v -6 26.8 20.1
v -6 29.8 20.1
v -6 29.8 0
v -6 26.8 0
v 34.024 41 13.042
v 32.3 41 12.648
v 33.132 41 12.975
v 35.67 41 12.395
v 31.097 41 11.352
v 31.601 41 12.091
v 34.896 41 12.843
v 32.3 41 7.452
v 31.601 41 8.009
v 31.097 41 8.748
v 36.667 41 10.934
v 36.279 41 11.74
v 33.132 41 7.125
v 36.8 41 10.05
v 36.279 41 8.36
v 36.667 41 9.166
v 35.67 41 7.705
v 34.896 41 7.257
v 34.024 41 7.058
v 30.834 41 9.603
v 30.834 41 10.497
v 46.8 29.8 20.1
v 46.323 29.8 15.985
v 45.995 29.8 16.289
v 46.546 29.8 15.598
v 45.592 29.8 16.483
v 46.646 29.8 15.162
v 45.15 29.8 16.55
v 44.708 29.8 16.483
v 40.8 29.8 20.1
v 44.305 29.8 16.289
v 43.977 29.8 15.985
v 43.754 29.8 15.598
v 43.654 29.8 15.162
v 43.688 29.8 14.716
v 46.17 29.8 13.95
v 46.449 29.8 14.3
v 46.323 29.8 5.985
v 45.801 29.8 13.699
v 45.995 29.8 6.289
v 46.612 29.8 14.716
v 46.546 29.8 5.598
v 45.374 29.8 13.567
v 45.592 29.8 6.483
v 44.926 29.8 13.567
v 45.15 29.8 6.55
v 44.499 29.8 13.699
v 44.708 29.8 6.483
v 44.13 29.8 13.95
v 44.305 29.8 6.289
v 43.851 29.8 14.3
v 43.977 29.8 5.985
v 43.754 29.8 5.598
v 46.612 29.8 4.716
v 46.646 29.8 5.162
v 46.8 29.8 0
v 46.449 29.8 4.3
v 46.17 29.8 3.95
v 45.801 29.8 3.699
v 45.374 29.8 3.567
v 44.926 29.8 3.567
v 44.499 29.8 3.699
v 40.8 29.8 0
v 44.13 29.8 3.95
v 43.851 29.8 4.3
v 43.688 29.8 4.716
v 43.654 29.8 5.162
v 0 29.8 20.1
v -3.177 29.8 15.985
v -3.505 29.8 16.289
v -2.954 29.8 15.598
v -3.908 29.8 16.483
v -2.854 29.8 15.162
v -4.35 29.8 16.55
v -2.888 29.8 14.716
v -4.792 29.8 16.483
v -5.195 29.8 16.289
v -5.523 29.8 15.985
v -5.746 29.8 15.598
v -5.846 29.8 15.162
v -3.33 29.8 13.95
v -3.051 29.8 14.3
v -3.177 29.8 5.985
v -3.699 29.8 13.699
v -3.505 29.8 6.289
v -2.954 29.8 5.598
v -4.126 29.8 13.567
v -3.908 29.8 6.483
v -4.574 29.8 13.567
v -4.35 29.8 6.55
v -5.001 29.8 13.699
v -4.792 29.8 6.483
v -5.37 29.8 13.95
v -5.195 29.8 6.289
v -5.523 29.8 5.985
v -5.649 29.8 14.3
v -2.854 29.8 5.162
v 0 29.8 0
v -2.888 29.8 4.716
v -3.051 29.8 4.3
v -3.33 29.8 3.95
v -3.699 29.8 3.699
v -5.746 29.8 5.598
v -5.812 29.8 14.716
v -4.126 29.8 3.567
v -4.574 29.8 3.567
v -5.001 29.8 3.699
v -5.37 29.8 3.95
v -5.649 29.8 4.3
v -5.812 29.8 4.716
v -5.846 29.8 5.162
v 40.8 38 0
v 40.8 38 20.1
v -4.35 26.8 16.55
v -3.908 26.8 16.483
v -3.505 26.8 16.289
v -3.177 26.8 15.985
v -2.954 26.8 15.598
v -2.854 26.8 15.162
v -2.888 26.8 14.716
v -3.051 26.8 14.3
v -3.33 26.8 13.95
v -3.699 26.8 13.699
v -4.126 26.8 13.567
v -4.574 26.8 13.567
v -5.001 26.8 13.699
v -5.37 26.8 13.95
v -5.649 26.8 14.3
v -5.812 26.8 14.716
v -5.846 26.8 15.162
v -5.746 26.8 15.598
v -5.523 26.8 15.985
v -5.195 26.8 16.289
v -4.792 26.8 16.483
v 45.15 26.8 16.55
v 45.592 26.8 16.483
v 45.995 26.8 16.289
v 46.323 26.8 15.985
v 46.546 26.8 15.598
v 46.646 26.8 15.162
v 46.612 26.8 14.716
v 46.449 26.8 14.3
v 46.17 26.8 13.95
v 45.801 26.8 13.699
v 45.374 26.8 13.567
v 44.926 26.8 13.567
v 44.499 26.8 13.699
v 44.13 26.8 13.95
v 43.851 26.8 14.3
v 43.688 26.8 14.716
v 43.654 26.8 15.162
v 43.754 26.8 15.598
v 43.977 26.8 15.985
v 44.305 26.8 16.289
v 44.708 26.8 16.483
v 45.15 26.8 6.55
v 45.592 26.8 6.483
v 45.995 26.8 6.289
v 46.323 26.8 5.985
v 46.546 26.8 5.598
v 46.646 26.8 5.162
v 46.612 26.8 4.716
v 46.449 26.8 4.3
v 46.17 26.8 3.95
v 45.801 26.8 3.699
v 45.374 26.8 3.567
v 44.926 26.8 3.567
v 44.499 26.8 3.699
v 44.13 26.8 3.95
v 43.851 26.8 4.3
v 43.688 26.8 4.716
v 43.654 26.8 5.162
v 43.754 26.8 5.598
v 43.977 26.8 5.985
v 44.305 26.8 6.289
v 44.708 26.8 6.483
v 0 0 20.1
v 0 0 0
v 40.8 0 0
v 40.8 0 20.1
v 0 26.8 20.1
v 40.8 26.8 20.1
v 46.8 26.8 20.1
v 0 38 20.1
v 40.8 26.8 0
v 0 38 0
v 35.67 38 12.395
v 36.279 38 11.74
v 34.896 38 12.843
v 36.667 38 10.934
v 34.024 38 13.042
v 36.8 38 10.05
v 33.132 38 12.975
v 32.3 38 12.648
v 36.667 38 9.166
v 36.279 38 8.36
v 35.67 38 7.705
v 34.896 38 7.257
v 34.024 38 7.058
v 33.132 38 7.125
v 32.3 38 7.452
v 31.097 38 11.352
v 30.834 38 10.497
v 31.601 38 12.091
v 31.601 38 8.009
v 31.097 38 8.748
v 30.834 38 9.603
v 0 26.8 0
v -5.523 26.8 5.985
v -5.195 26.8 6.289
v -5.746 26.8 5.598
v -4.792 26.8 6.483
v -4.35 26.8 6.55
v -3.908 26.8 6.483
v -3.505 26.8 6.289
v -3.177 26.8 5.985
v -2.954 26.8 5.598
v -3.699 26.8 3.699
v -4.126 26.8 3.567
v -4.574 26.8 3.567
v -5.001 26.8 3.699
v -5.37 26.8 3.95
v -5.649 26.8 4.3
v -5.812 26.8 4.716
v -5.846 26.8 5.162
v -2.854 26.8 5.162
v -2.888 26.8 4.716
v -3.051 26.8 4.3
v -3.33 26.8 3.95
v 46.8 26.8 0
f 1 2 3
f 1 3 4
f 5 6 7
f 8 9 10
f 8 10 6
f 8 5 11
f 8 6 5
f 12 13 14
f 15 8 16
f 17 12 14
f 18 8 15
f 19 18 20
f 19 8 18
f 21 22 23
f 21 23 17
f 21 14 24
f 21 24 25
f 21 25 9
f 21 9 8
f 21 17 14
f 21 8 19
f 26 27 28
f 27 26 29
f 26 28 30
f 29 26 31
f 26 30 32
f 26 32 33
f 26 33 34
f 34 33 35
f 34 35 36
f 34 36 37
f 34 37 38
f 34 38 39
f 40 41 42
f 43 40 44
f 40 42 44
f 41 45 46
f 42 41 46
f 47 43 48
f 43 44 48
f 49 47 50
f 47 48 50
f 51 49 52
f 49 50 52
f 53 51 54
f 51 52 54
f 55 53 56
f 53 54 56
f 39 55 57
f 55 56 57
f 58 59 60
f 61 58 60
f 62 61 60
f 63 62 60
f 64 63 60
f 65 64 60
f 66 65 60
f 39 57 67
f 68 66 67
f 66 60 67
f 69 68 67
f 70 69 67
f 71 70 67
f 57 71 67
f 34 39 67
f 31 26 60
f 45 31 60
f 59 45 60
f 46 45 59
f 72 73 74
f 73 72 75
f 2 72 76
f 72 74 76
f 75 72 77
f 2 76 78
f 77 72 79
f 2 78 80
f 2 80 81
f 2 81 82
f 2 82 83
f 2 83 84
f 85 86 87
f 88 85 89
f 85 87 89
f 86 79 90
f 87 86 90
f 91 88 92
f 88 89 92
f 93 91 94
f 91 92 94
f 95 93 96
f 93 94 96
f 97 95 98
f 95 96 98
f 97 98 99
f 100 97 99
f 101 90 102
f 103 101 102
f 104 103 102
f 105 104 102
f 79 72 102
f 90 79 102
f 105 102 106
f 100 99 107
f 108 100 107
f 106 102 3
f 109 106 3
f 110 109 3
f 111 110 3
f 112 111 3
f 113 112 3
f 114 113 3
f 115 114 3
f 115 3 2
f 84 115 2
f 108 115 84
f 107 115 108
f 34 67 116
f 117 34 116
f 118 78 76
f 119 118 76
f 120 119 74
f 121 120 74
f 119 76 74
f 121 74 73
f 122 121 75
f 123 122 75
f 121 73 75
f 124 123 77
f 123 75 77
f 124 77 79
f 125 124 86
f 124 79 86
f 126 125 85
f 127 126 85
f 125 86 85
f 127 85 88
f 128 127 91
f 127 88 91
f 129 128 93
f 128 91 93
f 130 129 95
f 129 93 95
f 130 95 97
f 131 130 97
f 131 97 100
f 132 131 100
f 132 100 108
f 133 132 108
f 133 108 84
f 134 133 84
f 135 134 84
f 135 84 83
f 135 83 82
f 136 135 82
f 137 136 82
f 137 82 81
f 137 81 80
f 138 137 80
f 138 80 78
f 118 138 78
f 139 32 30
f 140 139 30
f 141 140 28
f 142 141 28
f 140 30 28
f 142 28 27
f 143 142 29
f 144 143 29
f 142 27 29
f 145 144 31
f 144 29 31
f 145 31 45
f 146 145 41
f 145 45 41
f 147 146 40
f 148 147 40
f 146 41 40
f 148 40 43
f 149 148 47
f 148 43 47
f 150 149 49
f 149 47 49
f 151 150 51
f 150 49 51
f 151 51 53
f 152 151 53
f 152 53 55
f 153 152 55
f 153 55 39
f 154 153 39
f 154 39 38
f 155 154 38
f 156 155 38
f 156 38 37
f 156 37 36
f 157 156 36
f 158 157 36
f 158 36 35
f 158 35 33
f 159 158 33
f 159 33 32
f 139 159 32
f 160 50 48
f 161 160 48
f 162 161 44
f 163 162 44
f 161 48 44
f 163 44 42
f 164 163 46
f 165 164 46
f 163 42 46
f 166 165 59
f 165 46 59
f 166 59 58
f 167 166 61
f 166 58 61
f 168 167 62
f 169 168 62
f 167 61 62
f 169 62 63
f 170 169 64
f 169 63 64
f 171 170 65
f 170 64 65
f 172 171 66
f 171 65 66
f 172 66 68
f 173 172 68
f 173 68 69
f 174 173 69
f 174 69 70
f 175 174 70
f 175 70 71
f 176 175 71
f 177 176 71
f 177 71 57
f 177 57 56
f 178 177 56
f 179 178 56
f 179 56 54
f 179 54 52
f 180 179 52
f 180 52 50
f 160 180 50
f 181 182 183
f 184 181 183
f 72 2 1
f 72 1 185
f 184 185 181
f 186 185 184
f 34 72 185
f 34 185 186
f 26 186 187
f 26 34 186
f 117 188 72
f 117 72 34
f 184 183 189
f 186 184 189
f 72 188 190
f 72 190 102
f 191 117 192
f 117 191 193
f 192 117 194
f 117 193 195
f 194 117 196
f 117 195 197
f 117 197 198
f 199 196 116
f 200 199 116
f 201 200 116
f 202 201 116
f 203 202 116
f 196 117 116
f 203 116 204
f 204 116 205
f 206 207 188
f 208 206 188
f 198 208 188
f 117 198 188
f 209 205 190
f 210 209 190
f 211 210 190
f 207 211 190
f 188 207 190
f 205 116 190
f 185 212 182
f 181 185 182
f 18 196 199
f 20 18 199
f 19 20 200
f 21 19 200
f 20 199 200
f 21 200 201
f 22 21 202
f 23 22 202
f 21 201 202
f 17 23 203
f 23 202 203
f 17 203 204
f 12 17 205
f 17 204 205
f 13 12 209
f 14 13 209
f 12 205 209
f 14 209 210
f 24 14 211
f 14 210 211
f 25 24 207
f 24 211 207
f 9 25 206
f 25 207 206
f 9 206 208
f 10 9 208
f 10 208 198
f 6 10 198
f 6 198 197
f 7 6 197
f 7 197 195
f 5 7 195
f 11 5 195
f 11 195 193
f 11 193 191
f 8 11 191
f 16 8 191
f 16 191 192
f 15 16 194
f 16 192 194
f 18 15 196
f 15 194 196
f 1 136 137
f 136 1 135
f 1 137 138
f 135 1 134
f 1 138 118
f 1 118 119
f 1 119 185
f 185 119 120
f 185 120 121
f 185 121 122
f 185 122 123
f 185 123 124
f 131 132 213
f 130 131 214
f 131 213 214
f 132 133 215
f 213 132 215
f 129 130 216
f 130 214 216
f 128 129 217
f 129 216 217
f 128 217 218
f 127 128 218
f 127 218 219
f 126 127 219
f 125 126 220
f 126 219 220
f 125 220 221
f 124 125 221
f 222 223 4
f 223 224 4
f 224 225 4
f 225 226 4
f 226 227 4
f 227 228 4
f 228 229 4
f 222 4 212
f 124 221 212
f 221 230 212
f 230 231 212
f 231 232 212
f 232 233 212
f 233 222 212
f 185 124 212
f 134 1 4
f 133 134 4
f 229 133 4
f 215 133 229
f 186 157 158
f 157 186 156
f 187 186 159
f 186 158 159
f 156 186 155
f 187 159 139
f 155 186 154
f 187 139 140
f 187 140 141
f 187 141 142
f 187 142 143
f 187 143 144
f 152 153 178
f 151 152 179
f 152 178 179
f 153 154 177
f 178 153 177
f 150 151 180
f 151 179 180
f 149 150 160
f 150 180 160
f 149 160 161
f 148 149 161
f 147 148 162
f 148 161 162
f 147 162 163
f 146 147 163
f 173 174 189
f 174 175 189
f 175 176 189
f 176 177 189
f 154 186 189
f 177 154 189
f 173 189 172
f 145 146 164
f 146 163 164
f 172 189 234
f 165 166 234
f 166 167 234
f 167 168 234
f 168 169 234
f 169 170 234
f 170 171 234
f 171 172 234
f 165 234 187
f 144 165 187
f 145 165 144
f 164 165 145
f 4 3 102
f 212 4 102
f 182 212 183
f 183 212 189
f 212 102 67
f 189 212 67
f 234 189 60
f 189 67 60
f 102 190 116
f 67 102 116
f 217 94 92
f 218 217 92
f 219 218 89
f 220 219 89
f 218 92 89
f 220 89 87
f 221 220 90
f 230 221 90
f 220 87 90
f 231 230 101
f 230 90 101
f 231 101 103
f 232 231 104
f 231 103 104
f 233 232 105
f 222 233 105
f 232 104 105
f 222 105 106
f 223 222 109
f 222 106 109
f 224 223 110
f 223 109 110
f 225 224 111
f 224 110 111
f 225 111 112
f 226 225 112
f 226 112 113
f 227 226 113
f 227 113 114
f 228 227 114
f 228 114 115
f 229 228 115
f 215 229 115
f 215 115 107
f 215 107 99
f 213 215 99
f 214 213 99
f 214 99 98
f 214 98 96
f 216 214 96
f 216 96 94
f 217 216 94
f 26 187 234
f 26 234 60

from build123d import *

# Parameters (mm, degrees)
BOSS_EXTRUDE1_DEPTH = 20.1
SKETCH2_R           = 3
BOSS_EXTRUDE2_DEPTH = 3
CUT_EXTRUDE1_REACH  = 61.011
SKETCH3_R           = 1.5


with BuildPart() as part:
    # Sketch1 → Boss-Extrude1 (new body)
    with BuildSketch(Plane.XY):
        Polygon((0, 0), (40.8, 0), (40.8, 26.8), (46.8, 26.8), (46.8, 29.8), (40.8, 29.8), (40.8, 38), (0, 38), (0, 29.8), (-6, 29.8), (-6, 26.8), (0, 26.8), align=None)
    extrude(amount=BOSS_EXTRUDE1_DEPTH)

    # Sketch2 → Boss-Extrude2 (add)
    with BuildSketch(Plane(origin=(0, 38, 0), x_dir=(1, 0, 0), z_dir=(0, 1, 0))):
        with Locations((33.8, -10.05)):
            Circle(SKETCH2_R)
    extrude(amount=BOSS_EXTRUDE2_DEPTH)

    # Sketch3 → Cut-Extrude1 (cut, up to next)
    with BuildSketch(Plane(origin=(0, 29.8, 0), x_dir=(1, 0, 0), z_dir=(0, 1, 0)), mode=Mode.PRIVATE) as cut_extrude1_sk1:
        with Locations(Location((45.15, -15.05, 0), (0, 0, 270))):
            Circle(SKETCH3_R)
    cut_extrude1_tool1 = extrude(cut_extrude1_sk1.sketch, amount=-CUT_EXTRUDE1_REACH, mode=Mode.PRIVATE) & part.part
    # Sketch3 → Cut-Extrude1 (cut, up to next)
    with BuildSketch(Plane(origin=(0, 29.8, 0), x_dir=(1, 0, 0), z_dir=(0, 1, 0)), mode=Mode.PRIVATE) as cut_extrude1_sk2:
        with Locations(Location((45.15, -5.05, 0), (0, 0, 270))):
            Circle(SKETCH3_R)
    cut_extrude1_tool2 = extrude(cut_extrude1_sk2.sketch, amount=-CUT_EXTRUDE1_REACH, mode=Mode.PRIVATE) & part.part
    # Sketch3 → Cut-Extrude1 (cut, up to next)
    with BuildSketch(Plane(origin=(0, 29.8, 0), x_dir=(1, 0, 0), z_dir=(0, 1, 0)), mode=Mode.PRIVATE) as cut_extrude1_sk3:
        with Locations(Location((-4.35, -5.05, 0), (0, 0, 270))):
            Circle(SKETCH3_R)
    cut_extrude1_tool3 = extrude(cut_extrude1_sk3.sketch, amount=-CUT_EXTRUDE1_REACH, mode=Mode.PRIVATE) & part.part
    # Sketch3 → Cut-Extrude1 (cut, up to next)
    with BuildSketch(Plane(origin=(0, 29.8, 0), x_dir=(1, 0, 0), z_dir=(0, 1, 0)), mode=Mode.PRIVATE) as cut_extrude1_sk4:
        with Locations(Location((-4.35, -15.05, 0), (0, 0, 270))):
            Circle(SKETCH3_R)
    cut_extrude1_tool4 = extrude(cut_extrude1_sk4.sketch, amount=-CUT_EXTRUDE1_REACH, mode=Mode.PRIVATE) & part.part
    add(cut_extrude1_tool1.solids().sort_by_distance((45.15, 29.8, 15.05))[0], mode=Mode.SUBTRACT)
    add(cut_extrude1_tool2.solids().sort_by_distance((45.15, 29.8, 5.05))[0], mode=Mode.SUBTRACT)
    add(cut_extrude1_tool3.solids().sort_by_distance((-4.35, 29.8, 5.05))[0], mode=Mode.SUBTRACT)
    add(cut_extrude1_tool4.solids().sort_by_distance((-4.35, 29.8, 15.05))[0], mode=Mode.SUBTRACT)


solid = part.part
